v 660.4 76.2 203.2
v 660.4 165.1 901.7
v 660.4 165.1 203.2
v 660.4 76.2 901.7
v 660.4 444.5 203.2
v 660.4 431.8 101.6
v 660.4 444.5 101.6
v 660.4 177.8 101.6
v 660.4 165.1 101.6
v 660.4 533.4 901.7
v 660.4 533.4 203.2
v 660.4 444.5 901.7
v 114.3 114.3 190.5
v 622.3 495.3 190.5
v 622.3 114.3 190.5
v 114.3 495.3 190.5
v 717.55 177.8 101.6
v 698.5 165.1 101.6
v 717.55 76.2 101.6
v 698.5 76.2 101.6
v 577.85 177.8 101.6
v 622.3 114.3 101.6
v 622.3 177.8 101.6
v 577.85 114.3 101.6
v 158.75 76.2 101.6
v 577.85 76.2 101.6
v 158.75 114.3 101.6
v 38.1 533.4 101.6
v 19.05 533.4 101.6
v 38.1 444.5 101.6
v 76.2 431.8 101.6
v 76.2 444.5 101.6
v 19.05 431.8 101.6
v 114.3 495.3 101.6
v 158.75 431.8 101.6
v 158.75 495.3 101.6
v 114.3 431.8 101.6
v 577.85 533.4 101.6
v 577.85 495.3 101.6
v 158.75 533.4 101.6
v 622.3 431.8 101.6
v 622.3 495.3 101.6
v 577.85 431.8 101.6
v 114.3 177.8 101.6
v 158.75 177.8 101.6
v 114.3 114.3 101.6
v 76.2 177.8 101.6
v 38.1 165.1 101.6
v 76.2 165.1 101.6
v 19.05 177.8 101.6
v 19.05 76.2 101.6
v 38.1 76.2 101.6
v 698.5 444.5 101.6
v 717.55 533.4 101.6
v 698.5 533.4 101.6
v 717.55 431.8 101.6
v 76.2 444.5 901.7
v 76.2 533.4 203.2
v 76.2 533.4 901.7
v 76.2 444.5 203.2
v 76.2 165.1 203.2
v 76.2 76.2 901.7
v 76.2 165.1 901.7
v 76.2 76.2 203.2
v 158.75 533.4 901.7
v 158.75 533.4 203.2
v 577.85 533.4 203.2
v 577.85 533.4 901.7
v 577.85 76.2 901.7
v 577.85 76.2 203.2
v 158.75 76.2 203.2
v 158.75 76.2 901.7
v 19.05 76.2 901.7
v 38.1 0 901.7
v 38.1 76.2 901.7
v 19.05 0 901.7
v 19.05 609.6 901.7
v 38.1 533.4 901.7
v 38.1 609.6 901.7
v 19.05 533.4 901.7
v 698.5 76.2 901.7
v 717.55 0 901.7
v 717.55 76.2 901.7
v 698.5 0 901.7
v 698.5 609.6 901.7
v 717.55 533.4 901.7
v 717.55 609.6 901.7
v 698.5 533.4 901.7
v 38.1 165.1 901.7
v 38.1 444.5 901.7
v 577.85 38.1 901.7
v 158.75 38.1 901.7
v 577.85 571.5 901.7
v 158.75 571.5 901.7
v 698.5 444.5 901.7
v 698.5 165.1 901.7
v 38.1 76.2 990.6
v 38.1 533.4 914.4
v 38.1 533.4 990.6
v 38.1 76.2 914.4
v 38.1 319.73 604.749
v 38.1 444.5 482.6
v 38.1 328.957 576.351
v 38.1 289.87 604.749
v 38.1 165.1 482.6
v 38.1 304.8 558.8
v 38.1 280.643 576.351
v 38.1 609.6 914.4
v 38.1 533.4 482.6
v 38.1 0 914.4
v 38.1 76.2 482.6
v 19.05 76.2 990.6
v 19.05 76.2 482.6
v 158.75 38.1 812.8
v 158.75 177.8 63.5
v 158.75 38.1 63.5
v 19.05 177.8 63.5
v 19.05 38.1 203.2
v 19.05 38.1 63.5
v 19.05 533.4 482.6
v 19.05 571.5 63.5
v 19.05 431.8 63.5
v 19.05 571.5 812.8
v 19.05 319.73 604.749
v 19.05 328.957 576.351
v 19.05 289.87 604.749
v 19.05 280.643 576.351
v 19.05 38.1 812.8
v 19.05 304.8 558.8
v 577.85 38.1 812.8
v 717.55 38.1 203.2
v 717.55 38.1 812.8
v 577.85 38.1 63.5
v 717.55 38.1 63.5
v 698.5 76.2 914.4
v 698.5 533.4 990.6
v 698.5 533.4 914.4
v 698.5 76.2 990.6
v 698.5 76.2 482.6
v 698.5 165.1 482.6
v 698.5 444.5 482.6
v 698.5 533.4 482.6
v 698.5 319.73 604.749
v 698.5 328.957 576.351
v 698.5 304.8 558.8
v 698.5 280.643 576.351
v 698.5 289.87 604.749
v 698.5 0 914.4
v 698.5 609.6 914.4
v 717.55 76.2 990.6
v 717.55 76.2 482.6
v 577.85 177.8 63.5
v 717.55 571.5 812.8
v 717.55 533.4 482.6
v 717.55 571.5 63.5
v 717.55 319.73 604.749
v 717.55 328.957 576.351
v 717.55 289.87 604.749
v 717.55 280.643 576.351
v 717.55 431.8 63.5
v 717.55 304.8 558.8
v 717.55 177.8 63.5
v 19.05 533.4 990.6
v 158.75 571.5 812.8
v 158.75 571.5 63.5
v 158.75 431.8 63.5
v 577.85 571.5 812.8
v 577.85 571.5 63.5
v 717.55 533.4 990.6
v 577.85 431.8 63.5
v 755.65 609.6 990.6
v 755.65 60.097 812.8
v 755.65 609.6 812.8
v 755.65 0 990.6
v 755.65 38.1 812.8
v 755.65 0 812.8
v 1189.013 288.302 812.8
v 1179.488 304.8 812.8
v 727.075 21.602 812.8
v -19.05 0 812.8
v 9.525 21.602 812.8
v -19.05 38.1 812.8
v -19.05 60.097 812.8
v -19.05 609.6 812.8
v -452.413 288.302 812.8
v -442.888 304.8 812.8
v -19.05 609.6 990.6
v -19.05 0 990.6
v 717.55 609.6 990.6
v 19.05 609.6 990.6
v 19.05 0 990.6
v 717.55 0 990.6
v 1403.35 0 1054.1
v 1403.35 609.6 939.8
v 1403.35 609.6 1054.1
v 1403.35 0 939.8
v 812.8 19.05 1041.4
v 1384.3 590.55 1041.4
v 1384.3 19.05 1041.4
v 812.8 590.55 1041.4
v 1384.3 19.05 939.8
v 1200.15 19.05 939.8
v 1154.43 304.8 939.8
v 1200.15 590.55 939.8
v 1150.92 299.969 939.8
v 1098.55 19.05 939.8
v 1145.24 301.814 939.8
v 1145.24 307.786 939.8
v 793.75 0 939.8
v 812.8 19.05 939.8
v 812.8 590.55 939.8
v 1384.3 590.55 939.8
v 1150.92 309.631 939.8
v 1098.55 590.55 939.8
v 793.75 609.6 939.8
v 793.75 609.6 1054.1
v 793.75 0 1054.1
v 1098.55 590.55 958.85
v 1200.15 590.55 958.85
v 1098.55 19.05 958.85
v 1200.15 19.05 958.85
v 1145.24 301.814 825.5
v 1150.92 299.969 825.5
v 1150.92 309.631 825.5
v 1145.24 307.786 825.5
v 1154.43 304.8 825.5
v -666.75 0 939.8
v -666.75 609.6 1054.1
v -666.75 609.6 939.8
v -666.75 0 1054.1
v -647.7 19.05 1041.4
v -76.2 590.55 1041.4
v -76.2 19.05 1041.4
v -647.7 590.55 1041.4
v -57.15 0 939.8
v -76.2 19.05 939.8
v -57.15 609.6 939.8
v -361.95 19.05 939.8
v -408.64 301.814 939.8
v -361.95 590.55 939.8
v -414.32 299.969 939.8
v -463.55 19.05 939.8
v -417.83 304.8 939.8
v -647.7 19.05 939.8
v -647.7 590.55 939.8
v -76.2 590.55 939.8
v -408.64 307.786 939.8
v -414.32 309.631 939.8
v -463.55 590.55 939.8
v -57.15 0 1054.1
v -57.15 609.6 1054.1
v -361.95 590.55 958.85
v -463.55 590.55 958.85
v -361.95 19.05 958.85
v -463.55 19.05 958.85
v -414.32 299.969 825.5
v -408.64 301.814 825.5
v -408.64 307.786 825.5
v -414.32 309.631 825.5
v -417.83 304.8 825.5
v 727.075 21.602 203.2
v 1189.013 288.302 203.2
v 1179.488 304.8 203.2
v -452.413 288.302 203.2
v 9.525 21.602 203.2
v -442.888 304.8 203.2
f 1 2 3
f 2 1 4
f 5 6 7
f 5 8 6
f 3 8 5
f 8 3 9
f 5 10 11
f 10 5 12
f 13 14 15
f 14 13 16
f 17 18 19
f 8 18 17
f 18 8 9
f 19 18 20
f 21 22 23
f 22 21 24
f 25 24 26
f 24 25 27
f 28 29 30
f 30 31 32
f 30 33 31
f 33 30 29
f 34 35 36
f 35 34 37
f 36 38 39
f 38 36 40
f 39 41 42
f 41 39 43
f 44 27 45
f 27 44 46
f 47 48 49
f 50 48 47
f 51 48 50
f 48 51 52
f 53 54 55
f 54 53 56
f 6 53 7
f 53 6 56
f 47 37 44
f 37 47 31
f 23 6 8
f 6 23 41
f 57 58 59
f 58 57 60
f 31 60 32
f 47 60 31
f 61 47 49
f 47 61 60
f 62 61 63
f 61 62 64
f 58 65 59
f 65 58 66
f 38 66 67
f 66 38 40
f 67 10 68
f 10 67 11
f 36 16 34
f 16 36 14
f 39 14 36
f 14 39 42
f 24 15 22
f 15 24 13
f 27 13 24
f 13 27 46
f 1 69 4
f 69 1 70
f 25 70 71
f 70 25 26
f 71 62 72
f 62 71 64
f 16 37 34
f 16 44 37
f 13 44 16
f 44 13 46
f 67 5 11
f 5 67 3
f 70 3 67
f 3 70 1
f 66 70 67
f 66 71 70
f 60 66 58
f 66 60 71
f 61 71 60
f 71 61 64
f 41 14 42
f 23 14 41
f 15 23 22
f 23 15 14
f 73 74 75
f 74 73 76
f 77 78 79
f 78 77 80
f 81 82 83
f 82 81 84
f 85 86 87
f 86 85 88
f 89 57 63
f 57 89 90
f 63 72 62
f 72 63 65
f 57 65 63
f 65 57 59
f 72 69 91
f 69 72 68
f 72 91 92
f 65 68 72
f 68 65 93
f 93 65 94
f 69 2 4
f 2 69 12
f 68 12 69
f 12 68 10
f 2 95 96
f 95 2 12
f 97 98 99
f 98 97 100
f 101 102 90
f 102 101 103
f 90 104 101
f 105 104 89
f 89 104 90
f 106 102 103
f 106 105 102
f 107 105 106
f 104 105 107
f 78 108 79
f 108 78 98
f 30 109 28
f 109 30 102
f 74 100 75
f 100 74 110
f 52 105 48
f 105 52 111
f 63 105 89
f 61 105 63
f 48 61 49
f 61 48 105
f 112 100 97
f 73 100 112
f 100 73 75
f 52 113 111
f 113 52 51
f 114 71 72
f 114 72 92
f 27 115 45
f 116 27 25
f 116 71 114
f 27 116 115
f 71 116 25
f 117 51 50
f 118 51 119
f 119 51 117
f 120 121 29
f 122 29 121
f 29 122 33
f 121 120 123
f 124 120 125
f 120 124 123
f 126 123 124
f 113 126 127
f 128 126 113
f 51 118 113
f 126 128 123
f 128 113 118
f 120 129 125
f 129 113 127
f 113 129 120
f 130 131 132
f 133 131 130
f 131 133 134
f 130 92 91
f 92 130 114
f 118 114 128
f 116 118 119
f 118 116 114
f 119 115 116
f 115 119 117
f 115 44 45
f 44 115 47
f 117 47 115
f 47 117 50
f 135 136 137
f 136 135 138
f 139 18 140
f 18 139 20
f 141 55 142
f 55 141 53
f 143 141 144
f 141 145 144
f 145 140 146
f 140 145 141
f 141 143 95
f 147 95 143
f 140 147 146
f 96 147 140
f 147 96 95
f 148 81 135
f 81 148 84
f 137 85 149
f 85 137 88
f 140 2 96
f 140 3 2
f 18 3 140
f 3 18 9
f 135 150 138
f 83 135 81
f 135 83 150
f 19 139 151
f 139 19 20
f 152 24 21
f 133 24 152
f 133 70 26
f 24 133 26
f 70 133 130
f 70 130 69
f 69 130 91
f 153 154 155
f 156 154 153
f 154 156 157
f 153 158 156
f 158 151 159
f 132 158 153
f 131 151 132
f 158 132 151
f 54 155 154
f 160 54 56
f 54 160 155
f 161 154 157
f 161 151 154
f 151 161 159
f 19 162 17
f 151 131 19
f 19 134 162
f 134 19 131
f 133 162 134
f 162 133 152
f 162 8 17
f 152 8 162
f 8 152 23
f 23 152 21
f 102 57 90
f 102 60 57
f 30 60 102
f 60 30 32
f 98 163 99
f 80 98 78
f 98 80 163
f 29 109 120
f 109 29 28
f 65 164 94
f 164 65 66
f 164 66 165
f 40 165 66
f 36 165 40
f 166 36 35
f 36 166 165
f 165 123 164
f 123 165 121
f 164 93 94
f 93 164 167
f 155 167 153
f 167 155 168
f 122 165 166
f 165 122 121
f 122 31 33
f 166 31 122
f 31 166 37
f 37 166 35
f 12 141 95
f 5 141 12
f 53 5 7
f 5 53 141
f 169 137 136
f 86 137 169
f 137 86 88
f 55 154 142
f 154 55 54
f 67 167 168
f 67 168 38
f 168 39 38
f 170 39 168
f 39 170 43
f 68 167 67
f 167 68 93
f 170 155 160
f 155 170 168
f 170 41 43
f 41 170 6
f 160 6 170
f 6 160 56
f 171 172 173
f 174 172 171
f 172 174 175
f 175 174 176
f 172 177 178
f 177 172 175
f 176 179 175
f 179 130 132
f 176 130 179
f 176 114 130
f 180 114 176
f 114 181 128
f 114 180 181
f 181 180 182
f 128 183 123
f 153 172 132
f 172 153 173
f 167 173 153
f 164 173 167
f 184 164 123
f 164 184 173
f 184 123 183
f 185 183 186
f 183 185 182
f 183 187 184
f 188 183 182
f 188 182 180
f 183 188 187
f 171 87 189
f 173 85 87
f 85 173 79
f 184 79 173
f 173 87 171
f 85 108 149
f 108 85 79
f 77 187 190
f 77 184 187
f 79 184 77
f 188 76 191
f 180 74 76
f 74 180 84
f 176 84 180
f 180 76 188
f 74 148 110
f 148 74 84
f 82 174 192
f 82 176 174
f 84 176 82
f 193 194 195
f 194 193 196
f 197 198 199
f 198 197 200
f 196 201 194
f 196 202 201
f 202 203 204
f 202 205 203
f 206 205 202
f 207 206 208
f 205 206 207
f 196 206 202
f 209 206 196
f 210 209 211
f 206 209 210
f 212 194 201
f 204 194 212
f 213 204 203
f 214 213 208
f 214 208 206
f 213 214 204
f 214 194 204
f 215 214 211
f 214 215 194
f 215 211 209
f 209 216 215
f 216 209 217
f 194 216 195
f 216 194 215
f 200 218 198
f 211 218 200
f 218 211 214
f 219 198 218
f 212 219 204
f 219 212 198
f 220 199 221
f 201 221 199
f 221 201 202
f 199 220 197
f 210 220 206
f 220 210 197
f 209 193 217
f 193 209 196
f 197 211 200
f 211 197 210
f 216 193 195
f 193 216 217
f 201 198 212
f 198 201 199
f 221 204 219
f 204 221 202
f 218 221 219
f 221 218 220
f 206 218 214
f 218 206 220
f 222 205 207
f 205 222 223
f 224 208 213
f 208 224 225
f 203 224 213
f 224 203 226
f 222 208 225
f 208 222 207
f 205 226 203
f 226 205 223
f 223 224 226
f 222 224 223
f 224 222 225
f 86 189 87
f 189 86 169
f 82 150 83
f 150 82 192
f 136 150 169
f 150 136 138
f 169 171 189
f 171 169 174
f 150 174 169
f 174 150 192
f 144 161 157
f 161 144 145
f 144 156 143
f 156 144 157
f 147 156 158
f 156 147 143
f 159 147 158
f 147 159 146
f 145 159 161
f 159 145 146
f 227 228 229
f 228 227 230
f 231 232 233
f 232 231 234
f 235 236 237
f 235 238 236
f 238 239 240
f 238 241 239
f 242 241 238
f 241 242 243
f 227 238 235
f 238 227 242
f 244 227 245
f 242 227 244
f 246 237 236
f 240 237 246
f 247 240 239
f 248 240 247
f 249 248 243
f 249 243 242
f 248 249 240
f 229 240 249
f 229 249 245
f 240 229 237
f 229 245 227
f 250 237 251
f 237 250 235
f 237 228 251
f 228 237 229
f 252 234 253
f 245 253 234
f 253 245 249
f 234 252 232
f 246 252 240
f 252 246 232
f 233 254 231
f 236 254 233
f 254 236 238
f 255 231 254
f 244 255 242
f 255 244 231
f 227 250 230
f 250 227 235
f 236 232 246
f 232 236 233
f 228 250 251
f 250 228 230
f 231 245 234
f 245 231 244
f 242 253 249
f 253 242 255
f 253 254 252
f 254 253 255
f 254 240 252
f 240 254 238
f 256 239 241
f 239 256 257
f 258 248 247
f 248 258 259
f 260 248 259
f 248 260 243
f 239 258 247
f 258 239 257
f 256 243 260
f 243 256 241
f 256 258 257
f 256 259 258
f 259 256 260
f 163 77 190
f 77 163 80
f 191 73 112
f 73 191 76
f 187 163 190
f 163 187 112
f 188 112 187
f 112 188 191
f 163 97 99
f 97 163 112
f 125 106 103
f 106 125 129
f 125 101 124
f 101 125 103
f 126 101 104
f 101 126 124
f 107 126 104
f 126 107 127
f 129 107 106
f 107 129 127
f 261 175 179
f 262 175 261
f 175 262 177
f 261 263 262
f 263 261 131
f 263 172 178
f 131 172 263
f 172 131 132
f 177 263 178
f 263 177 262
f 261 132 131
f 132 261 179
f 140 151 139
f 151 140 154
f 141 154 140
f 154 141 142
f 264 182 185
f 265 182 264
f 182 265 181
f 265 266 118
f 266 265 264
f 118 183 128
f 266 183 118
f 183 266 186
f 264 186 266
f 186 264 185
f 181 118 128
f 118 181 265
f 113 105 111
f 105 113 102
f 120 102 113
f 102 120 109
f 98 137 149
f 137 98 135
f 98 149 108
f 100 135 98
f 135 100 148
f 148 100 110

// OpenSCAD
union() {
	scale(v = [25.4000000000, 25.4000000000, 25.4000000000]) {
		translate(v = [3.0000000000, 3.0000000000, 4]) {
			translate(v = [0, 16.5000000000, 0]) {
				cube(size = [23.0000000000, 1.5000000000, 3.5000000000]);
			}
			cube(size = [23.0000000000, 1.5000000000, 3.5000000000]);
			translate(v = [0, 1.5000000000, 0]) {
				cube(size = [1.5000000000, 15.0000000000, 3.5000000000]);
			}
			translate(v = [0, 0, 3.5000000000]) {
				cube(size = [23.0000000000, 18.0000000000, 0.5000000000]);
			}
			translate(v = [21.5000000000, 1.5000000000, 0]) {
				cube(size = [1.5000000000, 15.0000000000, 3.5000000000]);
			}
		}
		translate(v = [1.5000000000, 1.5000000000, 4]) {
			translate(v = [0, 1.5000000000, 0]) {
				cube(size = [1.5000000000, 3.5000000000, 31.5000000000]);
			}
			translate(v = [-0.7500000000, 0, 0]) {
				cube(size = [5.5000000000, 1.5000000000, 31.5000000000]);
			}
			translate(v = [-0.7500000000, 0, -1.5000000000]) {
				cube(size = [5.5000000000, 5.5000000000, 1.5000000000]);
			}
		}
		translate(v = [27.5000000000, 1.5000000000, 4]) {
			scale(v = [-1, 1, 1]) {
				translate(v = [0, 1.5000000000, 0]) {
					cube(size = [1.5000000000, 3.5000000000, 31.5000000000]);
				}
				translate(v = [-0.7500000000, 0, 0]) {
					cube(size = [5.5000000000, 1.5000000000, 31.5000000000]);
				}
				translate(v = [-0.7500000000, 0, -1.5000000000]) {
					cube(size = [5.5000000000, 5.5000000000, 1.5000000000]);
				}
			}
		}
		translate(v = [1.5000000000, 22.5000000000, 4]) {
			scale(v = [1, -1, 1]) {
				translate(v = [0, 1.5000000000, 0]) {
					cube(size = [1.5000000000, 3.5000000000, 31.5000000000]);
				}
				translate(v = [-0.7500000000, 0, 0]) {
					cube(size = [5.5000000000, 1.5000000000, 31.5000000000]);
				}
				translate(v = [-0.7500000000, 0, -1.5000000000]) {
					cube(size = [5.5000000000, 5.5000000000, 1.5000000000]);
				}
			}
		}
		translate(v = [27.5000000000, 22.5000000000, 4]) {
			scale(v = [1, -1, 1]) {
				scale(v = [-1, 1, 1]) {
					translate(v = [0, 1.5000000000, 0]) {
						cube(size = [1.5000000000, 3.5000000000, 31.5000000000]);
					}
					translate(v = [-0.7500000000, 0, 0]) {
						cube(size = [5.5000000000, 1.5000000000, 31.5000000000]);
					}
					translate(v = [-0.7500000000, 0, -1.5000000000]) {
						cube(size = [5.5000000000, 5.5000000000, 1.5000000000]);
					}
				}
			}
		}
		translate(v = [1.5000000000, 0, 35.5000000000]) {
			cube(size = [26, 24, 0.5000000000]);
		}
		translate(v = [0, 0, 32.0000000000]) {
			translate(v = [-0.7500000000, 22.5000000000, 0]) {
				cube(size = [30.5000000000, 1.5000000000, 3.5000000000]);
			}
			translate(v = [-0.7500000000, 0, 0]) {
				cube(size = [30.5000000000, 1.5000000000, 3.5000000000]);
			}
			translate(v = [-0.7500000000, 1.5000000000, 0]) {
				cube(size = [1.5000000000, 21.0000000000, 3.5000000000]);
			}
			translate(v = [28.2500000000, 1.5000000000, 0]) {
				cube(size = [1.5000000000, 21.0000000000, 3.5000000000]);
			}
		}
		translate(v = [27.5000000000, 0, 36]) {
			translate(v = [3.7500000000, 0, 1]) {
				rotate(a = 0, v = [0, 1, 0]) {
					translate(v = [0, 23.2500000000, 0]) {
						cube(size = [24, 0.7500000000, 4]);
					}
					cube(size = [24, 0.7500000000, 4]);
					translate(v = [0, 0.7500000000, 0]) {
						cube(size = [0.7500000000, 22.5000000000, 4]);
					}
					translate(v = [0, 0, 4]) {
						cube(size = [24, 24, 0.5000000000]);
					}
					translate(v = [23.2500000000, 0.7500000000, 0]) {
						cube(size = [0.7500000000, 22.5000000000, 4]);
					}
					translate(v = [12.0000000000, 0.7500000000, 0]) {
						cube(size = [4, 22.5000000000, 0.7500000000]);
					}
					translate(v = [14.0000000000, 12.0000000000, -4.5000000000]) {
						cylinder(h = 4.5000000000, r = 0.2000000000);
					}
				}
			}
			difference() {
				translate(v = [0, 3.0000000000, -15.0000000000]) {
					cube(size = [0.7500000000, 18.0000000000, 18]);
				}
				translate(v = [-1, 12.0000000000, -13.0000000000]) {
					rotate(a = 90, v = [0, 1, 0]) {
						cylinder(h = 10, r = 1);
					}
				}
			}
			translate(v = [0.7500000000, 0, -0.5000000000]) {
				cube(size = [1.5000000000, 24, 3.5000000000]);
			}
		}
		translate(v = [1.5000000000, 0, 36]) {
			scale(v = [-1, 1, 1]) {
				translate(v = [3.7500000000, 0, 1]) {
					rotate(a = 0, v = [0, 1, 0]) {
						translate(v = [0, 23.2500000000, 0]) {
							cube(size = [24, 0.7500000000, 4]);
						}
						cube(size = [24, 0.7500000000, 4]);
						translate(v = [0, 0.7500000000, 0]) {
							cube(size = [0.7500000000, 22.5000000000, 4]);
						}
						translate(v = [0, 0, 4]) {
							cube(size = [24, 24, 0.5000000000]);
						}
						translate(v = [23.2500000000, 0.7500000000, 0]) {
							cube(size = [0.7500000000, 22.5000000000, 4]);
						}
						translate(v = [12.0000000000, 0.7500000000, 0]) {
							cube(size = [4, 22.5000000000, 0.7500000000]);
						}
						translate(v = [14.0000000000, 12.0000000000, -4.5000000000]) {
							cylinder(h = 4.5000000000, r = 0.2000000000);
						}
					}
				}
				difference() {
					translate(v = [0, 3.0000000000, -15.0000000000]) {
						cube(size = [0.7500000000, 18.0000000000, 18]);
					}
					translate(v = [-1, 12.0000000000, -13.0000000000]) {
						rotate(a = 90, v = [0, 1, 0]) {
							cylinder(h = 10, r = 1);
						}
					}
				}
				translate(v = [0.7500000000, 0, -0.5000000000]) {
					cube(size = [1.5000000000, 24, 3.5000000000]);
				}
			}
		}
		translate(v = [27.5000000000, 0, 36]) {
			translate(v = [0, 3.0000000000, -17.0000000000]) {
				cube(size = [0.7500000000, 18.0000000000, 2]);
			}
			difference() {
				translate(v = [0.7500000000, 1.5000000000, -28.0000000000]) {
					rotate(a = -60, v = [0, 0, 1]) {
						cube(size = [0.7500000000, 21.0000000000, 24]);
					}
				}
				translate(v = [-1, 12.0000000000, -13.0000000000]) {
					rotate(a = 90, v = [0, 1, 0]) {
						cylinder(h = 10, r = 1);
					}
				}
			}
		}
		translate(v = [1.5000000000, 0, 36]) {
			scale(v = [-1, 1, 1]) {
				translate(v = [0, 3.0000000000, -17.0000000000]) {
					cube(size = [0.7500000000, 18.0000000000, 2]);
				}
				difference() {
					translate(v = [0.7500000000, 1.5000000000, -28.0000000000]) {
						rotate(a = -60, v = [0, 0, 1]) {
							cube(size = [0.7500000000, 21.0000000000, 24]);
						}
					}
					translate(v = [-1, 12.0000000000, -13.0000000000]) {
						rotate(a = 90, v = [0, 1, 0]) {
							cylinder(h = 10, r = 1);
						}
					}
				}
			}
		}
	}
}
